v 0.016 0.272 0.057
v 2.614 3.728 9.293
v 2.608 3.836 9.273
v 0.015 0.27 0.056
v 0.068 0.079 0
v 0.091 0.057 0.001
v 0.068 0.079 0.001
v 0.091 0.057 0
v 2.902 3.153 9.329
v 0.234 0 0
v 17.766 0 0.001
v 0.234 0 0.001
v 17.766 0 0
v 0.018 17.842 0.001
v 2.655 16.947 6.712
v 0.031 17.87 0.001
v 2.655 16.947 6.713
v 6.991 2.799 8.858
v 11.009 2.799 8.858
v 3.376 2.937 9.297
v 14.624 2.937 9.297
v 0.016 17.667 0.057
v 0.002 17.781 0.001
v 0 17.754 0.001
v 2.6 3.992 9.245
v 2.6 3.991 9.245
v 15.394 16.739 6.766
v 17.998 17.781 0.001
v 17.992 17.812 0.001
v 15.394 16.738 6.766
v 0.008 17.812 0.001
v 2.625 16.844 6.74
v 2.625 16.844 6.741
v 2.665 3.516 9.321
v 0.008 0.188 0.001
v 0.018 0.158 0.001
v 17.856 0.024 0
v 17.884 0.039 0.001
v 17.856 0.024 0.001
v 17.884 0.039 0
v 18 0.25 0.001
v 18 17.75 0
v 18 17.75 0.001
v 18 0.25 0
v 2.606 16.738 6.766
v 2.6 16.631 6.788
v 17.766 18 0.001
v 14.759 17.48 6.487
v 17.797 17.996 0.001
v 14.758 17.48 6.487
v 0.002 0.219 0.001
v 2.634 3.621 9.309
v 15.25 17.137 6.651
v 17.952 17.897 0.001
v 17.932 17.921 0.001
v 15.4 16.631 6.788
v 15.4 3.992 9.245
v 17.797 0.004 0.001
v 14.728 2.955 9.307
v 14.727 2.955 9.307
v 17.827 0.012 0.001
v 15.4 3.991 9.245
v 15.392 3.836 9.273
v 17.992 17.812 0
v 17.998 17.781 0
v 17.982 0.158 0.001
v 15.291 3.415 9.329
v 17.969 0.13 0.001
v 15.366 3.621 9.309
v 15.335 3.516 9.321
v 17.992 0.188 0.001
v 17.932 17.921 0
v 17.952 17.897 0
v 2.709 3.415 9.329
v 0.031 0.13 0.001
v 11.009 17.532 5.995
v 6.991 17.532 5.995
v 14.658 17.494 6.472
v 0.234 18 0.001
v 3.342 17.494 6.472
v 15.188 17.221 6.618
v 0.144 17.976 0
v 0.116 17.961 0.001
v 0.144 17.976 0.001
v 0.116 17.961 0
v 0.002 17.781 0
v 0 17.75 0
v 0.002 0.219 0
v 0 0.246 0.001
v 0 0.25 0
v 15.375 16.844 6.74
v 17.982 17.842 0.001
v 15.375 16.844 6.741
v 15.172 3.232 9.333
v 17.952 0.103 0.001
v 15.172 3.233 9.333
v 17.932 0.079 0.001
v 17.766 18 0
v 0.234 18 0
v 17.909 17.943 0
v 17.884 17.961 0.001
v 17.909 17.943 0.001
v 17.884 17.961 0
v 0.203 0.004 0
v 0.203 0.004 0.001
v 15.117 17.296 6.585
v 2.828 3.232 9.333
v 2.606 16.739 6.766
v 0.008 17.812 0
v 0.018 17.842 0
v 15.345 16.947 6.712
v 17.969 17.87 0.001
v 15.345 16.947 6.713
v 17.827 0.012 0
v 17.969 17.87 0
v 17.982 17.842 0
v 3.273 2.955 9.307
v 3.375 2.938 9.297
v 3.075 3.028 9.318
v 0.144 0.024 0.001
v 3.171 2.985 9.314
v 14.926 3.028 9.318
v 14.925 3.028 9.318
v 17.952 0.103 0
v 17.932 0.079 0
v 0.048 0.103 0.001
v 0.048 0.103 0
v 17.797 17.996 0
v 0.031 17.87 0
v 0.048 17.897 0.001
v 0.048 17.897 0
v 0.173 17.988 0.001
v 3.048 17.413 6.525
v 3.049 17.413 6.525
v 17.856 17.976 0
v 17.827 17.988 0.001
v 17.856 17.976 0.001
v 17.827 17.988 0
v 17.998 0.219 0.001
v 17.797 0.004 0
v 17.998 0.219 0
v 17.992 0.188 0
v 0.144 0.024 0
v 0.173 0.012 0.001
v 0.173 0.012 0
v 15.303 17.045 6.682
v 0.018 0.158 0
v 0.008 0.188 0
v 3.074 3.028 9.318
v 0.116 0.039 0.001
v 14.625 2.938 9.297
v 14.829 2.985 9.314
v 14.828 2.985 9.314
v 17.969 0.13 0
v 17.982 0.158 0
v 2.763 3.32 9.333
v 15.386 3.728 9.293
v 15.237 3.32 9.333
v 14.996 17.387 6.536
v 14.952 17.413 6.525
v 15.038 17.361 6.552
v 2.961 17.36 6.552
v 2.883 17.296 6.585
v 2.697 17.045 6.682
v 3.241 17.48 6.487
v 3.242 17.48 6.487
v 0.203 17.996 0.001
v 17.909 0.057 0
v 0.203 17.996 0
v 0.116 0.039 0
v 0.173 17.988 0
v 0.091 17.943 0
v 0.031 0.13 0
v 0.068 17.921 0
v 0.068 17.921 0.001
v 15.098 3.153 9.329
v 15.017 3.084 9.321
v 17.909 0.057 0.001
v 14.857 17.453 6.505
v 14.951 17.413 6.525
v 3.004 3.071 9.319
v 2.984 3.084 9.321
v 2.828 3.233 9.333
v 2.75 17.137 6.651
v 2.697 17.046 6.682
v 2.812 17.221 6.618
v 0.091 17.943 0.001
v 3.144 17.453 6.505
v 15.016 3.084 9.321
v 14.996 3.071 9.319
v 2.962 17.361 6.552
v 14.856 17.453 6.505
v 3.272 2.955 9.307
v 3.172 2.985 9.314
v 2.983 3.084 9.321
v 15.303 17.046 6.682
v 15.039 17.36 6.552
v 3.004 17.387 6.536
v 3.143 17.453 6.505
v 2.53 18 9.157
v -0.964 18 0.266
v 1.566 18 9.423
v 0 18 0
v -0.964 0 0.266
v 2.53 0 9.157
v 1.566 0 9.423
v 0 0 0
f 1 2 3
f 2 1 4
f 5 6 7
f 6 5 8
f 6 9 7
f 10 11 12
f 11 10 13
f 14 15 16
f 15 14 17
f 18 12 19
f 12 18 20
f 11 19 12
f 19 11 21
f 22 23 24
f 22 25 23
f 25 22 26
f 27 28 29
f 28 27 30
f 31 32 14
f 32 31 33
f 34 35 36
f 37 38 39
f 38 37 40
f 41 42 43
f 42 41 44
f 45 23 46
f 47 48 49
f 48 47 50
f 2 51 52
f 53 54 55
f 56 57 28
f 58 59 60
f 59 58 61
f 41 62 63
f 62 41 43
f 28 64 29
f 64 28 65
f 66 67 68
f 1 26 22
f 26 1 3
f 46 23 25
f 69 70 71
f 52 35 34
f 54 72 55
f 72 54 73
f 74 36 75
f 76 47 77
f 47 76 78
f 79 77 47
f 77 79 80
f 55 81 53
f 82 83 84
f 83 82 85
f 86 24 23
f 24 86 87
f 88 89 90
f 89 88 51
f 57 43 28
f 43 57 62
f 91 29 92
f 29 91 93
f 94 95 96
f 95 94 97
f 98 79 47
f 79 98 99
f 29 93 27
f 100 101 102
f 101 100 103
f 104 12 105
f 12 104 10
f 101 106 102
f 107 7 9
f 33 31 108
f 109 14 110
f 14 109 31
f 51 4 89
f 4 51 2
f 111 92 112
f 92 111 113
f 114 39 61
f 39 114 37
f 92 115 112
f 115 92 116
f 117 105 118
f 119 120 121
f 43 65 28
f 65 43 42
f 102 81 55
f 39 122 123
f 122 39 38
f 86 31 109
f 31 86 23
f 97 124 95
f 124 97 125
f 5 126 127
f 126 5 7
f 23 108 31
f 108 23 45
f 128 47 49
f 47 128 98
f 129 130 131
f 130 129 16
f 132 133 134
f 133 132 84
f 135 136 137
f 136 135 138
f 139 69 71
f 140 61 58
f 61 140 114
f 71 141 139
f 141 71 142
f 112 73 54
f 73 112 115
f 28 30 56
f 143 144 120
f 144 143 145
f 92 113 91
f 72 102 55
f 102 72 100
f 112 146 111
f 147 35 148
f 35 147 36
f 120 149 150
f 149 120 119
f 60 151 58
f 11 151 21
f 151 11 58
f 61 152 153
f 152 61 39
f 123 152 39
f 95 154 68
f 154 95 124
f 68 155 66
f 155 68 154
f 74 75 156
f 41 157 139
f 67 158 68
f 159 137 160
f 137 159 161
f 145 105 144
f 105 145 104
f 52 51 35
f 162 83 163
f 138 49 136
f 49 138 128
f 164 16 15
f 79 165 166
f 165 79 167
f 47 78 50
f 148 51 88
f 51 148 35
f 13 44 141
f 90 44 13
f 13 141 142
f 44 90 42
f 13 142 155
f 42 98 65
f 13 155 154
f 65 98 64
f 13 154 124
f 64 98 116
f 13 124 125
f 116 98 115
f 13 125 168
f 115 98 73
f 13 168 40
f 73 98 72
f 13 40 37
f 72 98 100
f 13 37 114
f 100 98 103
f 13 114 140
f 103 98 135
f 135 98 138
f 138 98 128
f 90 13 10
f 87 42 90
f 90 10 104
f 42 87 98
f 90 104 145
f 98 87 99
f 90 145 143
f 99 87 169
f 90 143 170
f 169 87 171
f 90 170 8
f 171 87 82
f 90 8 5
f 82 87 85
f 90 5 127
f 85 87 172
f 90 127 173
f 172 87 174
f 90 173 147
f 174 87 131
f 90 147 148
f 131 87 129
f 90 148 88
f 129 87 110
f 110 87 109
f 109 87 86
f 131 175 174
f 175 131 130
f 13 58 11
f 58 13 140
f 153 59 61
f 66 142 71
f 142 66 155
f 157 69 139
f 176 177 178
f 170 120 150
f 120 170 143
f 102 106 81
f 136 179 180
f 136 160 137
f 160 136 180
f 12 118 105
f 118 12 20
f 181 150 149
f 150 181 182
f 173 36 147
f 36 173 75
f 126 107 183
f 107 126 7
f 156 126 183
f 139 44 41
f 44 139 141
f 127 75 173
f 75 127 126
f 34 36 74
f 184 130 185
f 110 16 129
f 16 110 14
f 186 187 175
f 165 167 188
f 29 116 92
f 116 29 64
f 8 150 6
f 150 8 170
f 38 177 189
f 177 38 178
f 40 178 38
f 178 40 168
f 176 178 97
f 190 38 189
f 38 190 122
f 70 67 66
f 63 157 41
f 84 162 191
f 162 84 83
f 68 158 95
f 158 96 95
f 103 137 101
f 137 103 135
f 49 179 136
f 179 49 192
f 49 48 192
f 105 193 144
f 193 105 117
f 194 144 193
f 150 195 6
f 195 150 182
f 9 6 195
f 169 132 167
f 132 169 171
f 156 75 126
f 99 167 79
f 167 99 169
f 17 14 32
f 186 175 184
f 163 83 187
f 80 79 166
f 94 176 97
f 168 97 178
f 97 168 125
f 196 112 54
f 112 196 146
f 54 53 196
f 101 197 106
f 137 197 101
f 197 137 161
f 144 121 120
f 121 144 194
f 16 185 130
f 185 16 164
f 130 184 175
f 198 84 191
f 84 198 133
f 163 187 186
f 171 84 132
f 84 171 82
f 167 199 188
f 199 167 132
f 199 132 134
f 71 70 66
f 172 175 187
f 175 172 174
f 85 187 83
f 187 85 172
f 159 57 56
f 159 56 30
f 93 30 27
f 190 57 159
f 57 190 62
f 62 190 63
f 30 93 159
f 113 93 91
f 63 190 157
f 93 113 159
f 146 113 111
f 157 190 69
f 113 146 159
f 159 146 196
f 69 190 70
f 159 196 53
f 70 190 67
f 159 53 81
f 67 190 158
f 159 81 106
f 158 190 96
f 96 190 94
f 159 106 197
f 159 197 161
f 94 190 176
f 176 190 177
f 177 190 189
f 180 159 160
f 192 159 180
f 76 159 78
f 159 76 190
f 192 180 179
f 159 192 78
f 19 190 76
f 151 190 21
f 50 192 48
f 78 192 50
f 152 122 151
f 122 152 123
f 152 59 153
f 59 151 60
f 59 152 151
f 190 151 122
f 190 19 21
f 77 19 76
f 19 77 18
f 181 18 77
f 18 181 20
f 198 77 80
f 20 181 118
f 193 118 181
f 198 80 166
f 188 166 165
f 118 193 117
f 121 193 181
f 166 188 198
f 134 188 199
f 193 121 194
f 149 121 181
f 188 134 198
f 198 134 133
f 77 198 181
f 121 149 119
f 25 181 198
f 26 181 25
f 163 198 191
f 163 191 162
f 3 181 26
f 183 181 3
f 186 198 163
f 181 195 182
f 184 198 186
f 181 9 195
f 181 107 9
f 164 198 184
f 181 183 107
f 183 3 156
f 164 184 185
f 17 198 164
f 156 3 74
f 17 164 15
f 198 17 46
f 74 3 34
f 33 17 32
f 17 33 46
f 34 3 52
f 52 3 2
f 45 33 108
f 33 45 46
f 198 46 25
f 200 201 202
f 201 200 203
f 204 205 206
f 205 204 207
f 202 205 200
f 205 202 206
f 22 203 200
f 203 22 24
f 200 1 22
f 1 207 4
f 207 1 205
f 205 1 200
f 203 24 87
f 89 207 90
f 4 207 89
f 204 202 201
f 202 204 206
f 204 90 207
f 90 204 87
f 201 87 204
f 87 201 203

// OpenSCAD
$fn = 50;

// thickness of the lofts used
LOFT_THICKNESS = 0.001; // this level of detail is indiscernable to a 3d printer

// Generate a square plane with rounded edges
module roundSquare(corner_r, hor_len, ver_len) {

    hull() {
        translate([corner_r, corner_r, 0]) {
            cylinder(h = LOFT_THICKNESS, r = corner_r);
            translate([0, ver_len - corner_r * 2, 0]) {
                cylinder(h = LOFT_THICKNESS, r = corner_r);
            }

            translate([hor_len - corner_r * 2, 0, 0]) {
                cylinder(h = LOFT_THICKNESS, r = corner_r);
                translate([0, ver_len - corner_r * 2, 0]) {
                    cylinder(h = LOFT_THICKNESS, r = corner_r);
                }
            }
        }
    }

}



// keycap top radius: 1.75 / 2 = 0.875
// roundSquare(1.75, 12.75, 14.75);

// row 4

// r4 keycap height: 9.5
//           backside offset: 0.25
//           topside offset: 2.625
//           top vertical length: 14.75
//           top horizontal length: 12.75
//           top face vertical offset: 3
//           scuplt angle: 11 degrees
//           sculpt curve cup radius: 64/2 = 32

difference() {
    hull() {
        // 0.25
        roundSquare(0.25,18,18);
        
        // todo: - figure out the weird ledge
        //       - make the top cube rounded
        translate([2.625,3,9.5]) {
            rotate(a = -11, v = [1, 0, 0]) {
                roundSquare(0.875, 12.75, 14.75);
            }
        }
    }
    
    // cup indent size: 0.75mm
    translate([9, 3 + 14.75 , 9.5 - sin(11) * 15 - 0.75]) {
        rotate(a = -11, v = [1, 0, 0]) {
            translate([0,0,32]) {
                rotate(a = 90, v = [1, 0, 0]) {
                    cylinder(h = 17, r = 32);
                }
            }
        }
    }

}

rotate(a = atan(2.625/9.5), v = [0,1,0])
{
    translate([-1,0,0]) cube([1,18,9.5]);
}
// keycap side length: 18
